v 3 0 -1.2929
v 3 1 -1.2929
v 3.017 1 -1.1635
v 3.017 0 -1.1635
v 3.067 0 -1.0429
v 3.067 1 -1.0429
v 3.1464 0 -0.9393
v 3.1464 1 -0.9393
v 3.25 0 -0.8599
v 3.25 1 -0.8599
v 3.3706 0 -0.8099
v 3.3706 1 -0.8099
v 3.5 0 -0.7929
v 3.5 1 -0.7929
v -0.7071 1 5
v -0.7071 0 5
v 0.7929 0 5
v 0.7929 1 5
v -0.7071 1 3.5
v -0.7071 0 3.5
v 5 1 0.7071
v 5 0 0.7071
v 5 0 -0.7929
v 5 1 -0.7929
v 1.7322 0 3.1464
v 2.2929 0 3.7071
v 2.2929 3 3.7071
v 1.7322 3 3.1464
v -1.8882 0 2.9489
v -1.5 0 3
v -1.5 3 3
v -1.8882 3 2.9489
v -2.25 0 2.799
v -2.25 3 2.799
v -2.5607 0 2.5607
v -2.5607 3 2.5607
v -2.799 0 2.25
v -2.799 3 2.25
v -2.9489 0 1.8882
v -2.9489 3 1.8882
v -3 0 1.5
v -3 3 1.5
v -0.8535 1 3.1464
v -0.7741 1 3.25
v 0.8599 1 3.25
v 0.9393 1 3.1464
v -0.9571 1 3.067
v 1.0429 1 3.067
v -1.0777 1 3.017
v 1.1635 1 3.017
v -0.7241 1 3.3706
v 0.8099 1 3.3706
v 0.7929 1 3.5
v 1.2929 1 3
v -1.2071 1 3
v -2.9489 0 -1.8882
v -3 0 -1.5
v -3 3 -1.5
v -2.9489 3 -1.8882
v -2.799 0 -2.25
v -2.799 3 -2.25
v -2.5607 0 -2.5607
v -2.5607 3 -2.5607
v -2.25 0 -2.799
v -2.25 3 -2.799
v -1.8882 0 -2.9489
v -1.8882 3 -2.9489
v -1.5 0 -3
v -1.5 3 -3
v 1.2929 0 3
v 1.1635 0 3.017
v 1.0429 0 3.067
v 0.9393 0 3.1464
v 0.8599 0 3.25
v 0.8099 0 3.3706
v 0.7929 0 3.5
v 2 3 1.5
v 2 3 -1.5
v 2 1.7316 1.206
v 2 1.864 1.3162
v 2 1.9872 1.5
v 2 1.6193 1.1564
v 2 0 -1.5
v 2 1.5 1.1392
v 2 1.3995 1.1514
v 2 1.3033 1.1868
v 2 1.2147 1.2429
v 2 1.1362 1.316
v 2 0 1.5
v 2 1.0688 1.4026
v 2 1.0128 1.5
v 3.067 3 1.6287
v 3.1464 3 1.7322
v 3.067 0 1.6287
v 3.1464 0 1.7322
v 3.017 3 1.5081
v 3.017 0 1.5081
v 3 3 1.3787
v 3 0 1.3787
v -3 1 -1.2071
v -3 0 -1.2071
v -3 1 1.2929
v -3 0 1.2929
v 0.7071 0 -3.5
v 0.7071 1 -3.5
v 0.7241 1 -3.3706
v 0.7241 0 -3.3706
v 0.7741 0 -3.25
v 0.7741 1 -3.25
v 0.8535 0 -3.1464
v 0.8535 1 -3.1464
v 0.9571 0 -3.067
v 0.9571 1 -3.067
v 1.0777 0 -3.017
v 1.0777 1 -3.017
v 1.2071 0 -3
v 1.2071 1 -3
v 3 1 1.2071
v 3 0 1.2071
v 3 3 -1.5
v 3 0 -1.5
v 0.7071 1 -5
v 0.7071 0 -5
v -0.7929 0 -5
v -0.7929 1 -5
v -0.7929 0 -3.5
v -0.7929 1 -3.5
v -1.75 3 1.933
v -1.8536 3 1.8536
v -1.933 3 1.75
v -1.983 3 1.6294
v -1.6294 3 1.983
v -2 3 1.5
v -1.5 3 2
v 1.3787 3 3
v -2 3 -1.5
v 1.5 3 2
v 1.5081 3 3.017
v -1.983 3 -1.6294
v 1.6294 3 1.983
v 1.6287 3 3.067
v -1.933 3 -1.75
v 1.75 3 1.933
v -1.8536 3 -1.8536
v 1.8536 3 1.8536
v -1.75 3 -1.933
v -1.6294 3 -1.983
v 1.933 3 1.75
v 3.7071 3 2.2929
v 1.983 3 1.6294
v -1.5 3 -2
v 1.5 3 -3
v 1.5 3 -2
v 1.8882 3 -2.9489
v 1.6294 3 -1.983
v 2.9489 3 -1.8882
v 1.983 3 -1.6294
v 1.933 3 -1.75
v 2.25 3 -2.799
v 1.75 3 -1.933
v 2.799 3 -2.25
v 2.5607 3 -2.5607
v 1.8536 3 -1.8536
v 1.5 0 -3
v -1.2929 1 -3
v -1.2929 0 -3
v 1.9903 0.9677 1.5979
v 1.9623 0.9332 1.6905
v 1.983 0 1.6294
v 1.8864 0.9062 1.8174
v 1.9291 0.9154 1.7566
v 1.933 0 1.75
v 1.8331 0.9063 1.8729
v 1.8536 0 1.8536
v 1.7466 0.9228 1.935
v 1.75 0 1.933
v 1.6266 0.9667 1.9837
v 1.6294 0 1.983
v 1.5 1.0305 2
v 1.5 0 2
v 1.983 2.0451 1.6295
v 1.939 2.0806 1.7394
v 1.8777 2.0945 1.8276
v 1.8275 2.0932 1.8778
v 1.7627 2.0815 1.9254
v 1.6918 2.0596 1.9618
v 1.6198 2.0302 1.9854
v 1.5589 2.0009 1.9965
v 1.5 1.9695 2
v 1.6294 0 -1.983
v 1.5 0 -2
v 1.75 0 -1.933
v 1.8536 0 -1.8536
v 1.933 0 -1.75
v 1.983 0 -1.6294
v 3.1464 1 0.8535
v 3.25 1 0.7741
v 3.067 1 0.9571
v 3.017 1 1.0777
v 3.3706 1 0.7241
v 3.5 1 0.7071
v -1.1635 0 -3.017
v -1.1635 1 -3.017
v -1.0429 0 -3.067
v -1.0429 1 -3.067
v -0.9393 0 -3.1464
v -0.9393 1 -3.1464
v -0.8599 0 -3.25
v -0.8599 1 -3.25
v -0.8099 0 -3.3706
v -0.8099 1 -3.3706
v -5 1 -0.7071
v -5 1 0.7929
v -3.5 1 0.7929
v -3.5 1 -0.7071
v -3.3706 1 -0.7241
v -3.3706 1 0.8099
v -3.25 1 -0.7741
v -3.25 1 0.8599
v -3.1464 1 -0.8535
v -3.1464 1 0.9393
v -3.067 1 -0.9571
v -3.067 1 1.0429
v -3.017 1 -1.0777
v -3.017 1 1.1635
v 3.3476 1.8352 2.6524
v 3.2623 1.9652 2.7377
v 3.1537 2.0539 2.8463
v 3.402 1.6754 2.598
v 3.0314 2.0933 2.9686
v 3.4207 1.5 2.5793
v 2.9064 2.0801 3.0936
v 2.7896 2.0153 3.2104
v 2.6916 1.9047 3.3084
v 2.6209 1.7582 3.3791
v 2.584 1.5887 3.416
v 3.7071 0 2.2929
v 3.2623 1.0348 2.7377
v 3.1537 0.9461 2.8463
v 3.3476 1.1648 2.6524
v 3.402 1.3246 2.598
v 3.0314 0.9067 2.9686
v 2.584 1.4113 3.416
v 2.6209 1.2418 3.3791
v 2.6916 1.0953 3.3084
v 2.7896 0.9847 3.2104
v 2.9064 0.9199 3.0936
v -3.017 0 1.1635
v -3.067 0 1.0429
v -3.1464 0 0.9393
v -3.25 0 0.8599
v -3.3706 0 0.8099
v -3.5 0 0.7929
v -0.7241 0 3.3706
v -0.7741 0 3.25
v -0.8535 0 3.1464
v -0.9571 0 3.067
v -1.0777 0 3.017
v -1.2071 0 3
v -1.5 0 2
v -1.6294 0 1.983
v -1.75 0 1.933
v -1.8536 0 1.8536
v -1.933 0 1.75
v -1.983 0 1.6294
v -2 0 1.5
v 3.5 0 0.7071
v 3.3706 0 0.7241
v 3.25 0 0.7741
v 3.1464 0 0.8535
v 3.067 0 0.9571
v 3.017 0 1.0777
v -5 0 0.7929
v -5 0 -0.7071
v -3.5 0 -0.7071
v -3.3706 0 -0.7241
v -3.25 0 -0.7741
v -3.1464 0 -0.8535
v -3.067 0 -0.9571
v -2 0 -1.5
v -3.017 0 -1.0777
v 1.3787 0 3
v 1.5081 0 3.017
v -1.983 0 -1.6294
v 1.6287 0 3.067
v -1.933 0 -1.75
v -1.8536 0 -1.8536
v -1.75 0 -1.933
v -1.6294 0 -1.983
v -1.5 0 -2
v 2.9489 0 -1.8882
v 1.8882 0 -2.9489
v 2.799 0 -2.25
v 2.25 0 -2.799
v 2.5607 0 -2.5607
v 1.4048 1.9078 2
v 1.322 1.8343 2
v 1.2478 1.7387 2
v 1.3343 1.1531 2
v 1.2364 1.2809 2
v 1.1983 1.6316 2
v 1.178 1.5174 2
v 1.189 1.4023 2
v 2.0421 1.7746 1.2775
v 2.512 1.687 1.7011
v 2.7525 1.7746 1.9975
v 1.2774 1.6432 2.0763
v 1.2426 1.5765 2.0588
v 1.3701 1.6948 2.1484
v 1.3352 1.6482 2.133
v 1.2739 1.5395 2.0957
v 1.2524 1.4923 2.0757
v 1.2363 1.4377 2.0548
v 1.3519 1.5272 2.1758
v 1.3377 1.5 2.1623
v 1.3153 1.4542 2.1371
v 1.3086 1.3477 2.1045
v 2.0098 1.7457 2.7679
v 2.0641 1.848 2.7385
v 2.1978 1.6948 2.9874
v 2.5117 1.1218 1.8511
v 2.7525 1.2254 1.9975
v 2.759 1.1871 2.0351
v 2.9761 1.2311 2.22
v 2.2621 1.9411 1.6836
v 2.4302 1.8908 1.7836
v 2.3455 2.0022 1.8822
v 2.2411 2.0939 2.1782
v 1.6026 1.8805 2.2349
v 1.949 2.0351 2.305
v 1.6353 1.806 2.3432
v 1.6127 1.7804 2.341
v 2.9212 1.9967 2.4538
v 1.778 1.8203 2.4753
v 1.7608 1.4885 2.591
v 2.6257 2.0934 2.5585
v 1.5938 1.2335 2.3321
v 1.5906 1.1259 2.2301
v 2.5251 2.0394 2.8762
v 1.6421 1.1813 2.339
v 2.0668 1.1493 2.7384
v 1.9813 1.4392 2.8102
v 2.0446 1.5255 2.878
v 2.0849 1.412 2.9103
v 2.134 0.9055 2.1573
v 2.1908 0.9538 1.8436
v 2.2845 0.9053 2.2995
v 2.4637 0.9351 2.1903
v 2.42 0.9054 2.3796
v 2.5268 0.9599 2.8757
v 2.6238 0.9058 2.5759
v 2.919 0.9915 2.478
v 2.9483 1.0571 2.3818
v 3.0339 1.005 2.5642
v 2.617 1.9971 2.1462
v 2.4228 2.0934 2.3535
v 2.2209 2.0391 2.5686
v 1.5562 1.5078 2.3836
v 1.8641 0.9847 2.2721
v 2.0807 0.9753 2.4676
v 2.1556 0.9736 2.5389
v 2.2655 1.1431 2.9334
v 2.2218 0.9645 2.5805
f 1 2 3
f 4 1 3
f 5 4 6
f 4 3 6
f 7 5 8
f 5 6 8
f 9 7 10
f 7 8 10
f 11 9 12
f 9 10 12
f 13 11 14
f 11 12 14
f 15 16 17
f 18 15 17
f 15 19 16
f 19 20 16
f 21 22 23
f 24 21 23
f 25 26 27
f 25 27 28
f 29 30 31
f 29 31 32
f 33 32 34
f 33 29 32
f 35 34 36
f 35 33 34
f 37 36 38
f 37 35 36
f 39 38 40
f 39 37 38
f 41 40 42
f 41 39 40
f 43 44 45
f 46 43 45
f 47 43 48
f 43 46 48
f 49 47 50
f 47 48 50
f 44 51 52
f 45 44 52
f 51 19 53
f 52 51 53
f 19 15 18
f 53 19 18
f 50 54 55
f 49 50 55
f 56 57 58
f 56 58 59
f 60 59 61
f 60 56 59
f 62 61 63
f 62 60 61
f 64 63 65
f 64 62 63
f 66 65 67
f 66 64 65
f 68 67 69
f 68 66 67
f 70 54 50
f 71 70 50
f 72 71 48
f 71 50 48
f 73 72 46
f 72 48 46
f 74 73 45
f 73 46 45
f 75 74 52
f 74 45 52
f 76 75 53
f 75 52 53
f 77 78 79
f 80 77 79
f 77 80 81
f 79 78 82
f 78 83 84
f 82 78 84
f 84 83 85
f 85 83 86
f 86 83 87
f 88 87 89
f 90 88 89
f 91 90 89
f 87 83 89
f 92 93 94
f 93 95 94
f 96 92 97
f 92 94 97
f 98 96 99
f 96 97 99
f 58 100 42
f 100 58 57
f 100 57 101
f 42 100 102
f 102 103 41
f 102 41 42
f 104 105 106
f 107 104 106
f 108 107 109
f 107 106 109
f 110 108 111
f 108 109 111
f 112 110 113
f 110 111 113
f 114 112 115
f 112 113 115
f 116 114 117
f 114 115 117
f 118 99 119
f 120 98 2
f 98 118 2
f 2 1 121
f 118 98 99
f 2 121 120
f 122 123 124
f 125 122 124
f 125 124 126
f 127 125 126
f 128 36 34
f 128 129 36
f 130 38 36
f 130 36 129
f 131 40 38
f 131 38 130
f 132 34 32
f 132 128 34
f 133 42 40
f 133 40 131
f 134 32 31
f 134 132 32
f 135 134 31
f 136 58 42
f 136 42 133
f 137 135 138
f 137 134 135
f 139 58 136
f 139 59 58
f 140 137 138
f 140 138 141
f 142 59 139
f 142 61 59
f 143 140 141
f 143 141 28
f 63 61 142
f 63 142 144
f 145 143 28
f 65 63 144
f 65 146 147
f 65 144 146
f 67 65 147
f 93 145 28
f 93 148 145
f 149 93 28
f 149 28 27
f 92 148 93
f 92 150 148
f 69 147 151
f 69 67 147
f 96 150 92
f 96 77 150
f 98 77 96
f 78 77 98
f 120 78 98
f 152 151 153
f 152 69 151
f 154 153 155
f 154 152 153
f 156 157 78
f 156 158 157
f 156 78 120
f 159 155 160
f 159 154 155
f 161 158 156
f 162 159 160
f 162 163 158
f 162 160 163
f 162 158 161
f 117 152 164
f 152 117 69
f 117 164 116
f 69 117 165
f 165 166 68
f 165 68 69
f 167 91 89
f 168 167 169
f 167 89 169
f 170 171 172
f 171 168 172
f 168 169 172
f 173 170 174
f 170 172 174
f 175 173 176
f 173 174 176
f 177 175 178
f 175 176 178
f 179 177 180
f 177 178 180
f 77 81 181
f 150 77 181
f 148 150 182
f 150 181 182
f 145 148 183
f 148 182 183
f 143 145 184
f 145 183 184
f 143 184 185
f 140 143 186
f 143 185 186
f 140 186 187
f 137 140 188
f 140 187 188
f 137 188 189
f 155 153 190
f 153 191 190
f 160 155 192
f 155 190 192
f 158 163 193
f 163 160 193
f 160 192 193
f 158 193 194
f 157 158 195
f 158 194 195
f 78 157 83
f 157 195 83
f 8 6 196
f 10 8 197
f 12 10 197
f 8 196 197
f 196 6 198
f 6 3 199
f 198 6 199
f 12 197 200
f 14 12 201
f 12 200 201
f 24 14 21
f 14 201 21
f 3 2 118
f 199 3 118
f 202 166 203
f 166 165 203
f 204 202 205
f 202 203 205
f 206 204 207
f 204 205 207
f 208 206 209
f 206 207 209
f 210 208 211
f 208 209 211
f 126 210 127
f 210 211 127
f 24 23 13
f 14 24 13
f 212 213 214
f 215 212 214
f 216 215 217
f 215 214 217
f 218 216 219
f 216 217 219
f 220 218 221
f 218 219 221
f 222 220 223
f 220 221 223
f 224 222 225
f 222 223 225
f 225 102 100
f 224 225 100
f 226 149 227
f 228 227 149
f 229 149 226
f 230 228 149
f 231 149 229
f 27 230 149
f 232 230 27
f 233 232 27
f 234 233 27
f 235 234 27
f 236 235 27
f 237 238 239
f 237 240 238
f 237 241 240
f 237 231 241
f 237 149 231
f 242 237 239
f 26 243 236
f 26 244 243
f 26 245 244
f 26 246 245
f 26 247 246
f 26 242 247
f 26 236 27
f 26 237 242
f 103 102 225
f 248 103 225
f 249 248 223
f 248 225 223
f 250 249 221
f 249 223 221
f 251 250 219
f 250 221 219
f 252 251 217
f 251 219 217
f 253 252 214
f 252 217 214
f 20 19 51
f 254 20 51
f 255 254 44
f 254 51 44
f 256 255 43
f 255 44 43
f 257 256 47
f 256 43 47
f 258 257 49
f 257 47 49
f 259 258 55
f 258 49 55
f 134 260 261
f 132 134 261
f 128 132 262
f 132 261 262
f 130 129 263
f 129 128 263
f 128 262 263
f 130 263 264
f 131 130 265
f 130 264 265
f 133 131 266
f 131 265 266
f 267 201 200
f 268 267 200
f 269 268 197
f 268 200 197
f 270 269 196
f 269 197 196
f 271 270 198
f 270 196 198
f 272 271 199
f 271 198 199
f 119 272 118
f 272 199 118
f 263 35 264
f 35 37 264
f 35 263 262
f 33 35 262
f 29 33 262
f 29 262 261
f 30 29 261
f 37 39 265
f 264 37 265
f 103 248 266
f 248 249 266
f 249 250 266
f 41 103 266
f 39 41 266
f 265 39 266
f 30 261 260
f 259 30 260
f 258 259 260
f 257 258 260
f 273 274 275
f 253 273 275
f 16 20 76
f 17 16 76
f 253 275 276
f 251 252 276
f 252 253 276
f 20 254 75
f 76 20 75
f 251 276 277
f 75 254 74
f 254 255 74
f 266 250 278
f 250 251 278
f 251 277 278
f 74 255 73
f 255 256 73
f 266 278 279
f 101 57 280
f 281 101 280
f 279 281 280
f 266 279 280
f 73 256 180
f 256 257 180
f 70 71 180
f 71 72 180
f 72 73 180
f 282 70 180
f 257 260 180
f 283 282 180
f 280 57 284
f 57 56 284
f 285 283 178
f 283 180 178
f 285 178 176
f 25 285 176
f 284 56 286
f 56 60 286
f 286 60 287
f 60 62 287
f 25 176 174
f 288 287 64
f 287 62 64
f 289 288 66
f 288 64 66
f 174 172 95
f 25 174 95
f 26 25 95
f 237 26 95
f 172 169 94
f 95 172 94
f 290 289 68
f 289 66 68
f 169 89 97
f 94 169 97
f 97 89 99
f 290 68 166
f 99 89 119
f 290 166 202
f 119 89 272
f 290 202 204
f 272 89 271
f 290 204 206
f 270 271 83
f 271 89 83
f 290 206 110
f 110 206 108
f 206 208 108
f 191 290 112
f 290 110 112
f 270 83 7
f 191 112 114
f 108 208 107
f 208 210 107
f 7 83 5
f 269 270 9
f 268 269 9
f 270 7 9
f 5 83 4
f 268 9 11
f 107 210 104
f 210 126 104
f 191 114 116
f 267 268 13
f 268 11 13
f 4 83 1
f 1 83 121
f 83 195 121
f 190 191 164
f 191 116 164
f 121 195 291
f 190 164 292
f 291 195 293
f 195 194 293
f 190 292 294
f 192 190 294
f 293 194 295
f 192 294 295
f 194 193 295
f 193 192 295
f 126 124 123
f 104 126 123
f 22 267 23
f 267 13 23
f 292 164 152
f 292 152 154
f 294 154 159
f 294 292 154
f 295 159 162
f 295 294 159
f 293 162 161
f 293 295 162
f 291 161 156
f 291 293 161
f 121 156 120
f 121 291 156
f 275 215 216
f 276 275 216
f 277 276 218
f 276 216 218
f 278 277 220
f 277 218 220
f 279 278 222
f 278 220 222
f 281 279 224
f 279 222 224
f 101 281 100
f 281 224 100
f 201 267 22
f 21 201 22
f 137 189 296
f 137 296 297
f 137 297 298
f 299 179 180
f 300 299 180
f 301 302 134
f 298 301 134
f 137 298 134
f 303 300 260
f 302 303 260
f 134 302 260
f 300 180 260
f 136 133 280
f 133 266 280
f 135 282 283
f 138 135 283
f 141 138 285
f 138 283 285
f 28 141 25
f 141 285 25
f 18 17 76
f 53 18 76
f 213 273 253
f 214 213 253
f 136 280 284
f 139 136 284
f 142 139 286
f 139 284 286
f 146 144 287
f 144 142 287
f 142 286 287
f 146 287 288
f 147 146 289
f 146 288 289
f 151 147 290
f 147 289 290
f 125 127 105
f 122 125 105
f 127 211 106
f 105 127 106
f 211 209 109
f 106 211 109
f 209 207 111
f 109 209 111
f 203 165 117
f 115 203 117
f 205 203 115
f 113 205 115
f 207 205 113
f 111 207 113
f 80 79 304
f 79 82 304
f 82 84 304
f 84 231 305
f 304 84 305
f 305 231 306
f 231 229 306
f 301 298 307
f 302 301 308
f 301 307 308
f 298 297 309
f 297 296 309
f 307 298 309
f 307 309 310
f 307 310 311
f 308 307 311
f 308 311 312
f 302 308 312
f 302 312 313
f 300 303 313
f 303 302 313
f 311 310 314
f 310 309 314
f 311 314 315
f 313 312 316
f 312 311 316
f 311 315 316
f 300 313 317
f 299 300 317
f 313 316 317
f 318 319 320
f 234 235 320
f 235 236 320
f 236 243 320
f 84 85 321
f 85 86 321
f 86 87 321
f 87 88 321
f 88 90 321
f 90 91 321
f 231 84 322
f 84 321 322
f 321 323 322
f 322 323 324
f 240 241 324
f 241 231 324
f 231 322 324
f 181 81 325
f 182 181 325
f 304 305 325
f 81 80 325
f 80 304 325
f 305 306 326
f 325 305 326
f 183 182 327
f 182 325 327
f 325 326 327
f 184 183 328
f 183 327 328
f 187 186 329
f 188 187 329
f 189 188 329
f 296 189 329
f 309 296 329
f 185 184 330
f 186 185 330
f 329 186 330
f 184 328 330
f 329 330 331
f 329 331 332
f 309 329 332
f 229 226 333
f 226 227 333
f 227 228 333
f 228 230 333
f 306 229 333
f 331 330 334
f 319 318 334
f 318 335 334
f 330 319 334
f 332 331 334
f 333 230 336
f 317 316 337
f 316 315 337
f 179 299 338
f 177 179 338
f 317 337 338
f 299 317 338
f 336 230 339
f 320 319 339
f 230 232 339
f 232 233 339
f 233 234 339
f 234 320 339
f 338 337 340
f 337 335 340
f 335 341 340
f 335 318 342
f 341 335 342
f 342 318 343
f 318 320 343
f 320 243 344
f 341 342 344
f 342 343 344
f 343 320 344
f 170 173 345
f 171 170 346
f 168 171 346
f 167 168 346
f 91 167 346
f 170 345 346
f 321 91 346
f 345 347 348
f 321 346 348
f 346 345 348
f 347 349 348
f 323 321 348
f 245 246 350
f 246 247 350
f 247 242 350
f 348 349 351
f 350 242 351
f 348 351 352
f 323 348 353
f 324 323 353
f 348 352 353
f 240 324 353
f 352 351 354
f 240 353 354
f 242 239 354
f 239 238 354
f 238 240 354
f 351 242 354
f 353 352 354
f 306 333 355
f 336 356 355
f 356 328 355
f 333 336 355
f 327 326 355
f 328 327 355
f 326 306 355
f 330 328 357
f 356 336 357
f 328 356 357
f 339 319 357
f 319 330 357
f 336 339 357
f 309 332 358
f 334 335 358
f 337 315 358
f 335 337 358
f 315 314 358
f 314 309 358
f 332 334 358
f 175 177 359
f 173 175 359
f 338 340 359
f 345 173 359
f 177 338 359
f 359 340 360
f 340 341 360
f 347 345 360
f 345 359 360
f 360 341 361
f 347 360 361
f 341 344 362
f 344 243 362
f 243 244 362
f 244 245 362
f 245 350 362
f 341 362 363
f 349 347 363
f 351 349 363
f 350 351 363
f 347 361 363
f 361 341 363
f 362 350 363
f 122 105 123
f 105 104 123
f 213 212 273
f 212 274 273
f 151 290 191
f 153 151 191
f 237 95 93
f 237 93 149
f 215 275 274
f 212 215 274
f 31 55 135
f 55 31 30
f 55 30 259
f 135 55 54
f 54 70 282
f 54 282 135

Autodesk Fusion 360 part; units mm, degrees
sketch "Sketch1" plane through (0, 0, 0) normal (0, 1, 0) x (1, 0, 0)
  line L0 (1.5, -2) -> (-1.5, -2)
  line L1 (-2, -1.5) -> (-2, 1.5)
  line L2 (-1.5, 2) -> (1.5, 2)
  line L3 (2, 1.5) -> (2, -1.5)
  line L4 (2, -2) -> (-2, 2) construction
  line L5 (-2, -2) -> (2, 2) construction
  line L6 (-1.5, -3) -> (1.5858, -3)
  line L7 (3, -1.5858) -> (3, 1.5)
  line L8 (1.5, 3) -> (-1.5, 3)
  line L9 (-3, 1.5) -> (-3, -1.5)
  line L10 (-3, -3) -> (3, 3) construction
  line L11 (3, -3) -> (-2.9939, 2.9939) construction
  arc A0 (-1.5, 2) -> (-2, 1.5) centre (-1.5, 1.5) ccw
  arc A1 (-2, -1.5) -> (-1.5, -2) centre (-1.5, -1.5) ccw
  arc A2 (1.5, -2) -> (2, -1.5) centre (1.5, -1.5) ccw
  arc A3 (2, 1.5) -> (1.5, 2) centre (1.5, 1.5) ccw
  arc A4 (-1.5, 3) -> (-3, 1.5) centre (-1.5, 1.5) ccw
  arc A5 (-3, -1.5) -> (-1.5, -3) centre (-1.5, -1.5) ccw
  arc A6 (3, 1.5) -> (1.5, 3) centre (1.5, 1.5) ccw
  line L12 (3.7071, -2.2929) -> (2.2929, -3.7071)
  line L13 (2.2929, -3.7071) -> (1.5858, -3)
  line L14 (3, -1.5858) -> (3.7071, -2.2929)
  dimension "d1" = 4
  dimension "d2" = 4
  dimension "d3" = 0.5
  dimension "d4" = 6
  dimension "d5" = 6
  dimension "d6" = 1.5
  dimension "d7" = 2
  dimension "d31" = 2
  dimension "d32" = 3
extrude "Extrude1" add sketch "Sketch1" along normal blind 2.5
sketch "Sketch2" plane through (3, 0, 3) normal (0.707107, 0, 0.707107) x (0.707107, 0, -0.707107)
  line L0 (-1, 0) -> (1, 0)
  line L1 (1, 0) -> (1, 2.5)
  line L2 (1, 2.5) -> (-1, 2.5)
  line L3 (-1, 2.5) -> (-1, 0)
  circle A0 centre (0, 1.5) radius 0.595
  dimension "d10" = 1.19
  dimension "d11" = 1.5
extrude "Extrude2" cut sketch "Sketch2" against normal blind 3.4 contours A0
sketch "Sketch4" plane through (0, 0, 0) normal (0, -1, 0) x (1, 0, 0)
  arc A0 (2, 1.5) -> (1.5, 2) centre (1.5, 1.5) ccw
  line L0 (2, 1.5) -> (2, -1.5)
  arc A1 (1.5, -2) -> (2, -1.5) centre (1.5, -1.5) ccw
  line L1 (1.5, -2) -> (-1.5, -2)
  arc A2 (-2, -1.5) -> (-1.5, -2) centre (-1.5, -1.5) ccw
  line L2 (-2, -1.5) -> (-2, 1.5)
  arc A3 (-1.5, 2) -> (-2, 1.5) centre (-1.5, 1.5) ccw
  line L3 (-1.5, 2) -> (1.5, 2)
  line L4 (3, 1.5858) -> (3.7071, 2.2929)
  line L5 (3.7071, 2.2929) -> (2.2929, 3.7071)
  line L6 (2.2929, 3.7071) -> (1.5858, 3)
  line L7 (1.5858, 3) -> (-1.5, 3)
  arc A4 (-1.5, 3) -> (-3, 1.5) centre (-1.5, 1.5) ccw
  line L8 (-3, 1.5) -> (-3, -1.5)
  arc A5 (-3, -1.5) -> (-1.5, -3) centre (-1.5, -1.5) ccw
  line L9 (-1.5, -3) -> (1.5, -3)
  arc A6 (1.5, -3) -> (3, -1.5) centre (1.5, -1.5) ccw
  line L10 (3, -1.5) -> (3, 1.5858)
  line L11 (-0.7071, 5) -> (0.7929, 5)
  line L12 (0.7929, 5) -> (0.7929, 3)
  line L13 (-0.7071, 3) -> (-0.7071, 5)
  line L14 (-0.7071, 5) -> (0.6239, 1.4506) construction
  line L15 (0.7929, 5) -> (-0.5381, 1.4506) construction
  line L16 (-5, -0.7071) -> (-1.4506, 0.6239) construction
  line L17 (-5, -0.7071) -> (-5, 0.7929)
  line L18 (-5, 0.7929) -> (-1.4506, -0.5381) construction
  line L19 (-3, -0.7071) -> (-5, -0.7071)
  line L20 (-5, 0.7929) -> (-3, 0.7929)
  line L21 (0.7071, -5) -> (-0.6239, -1.4506) construction
  line L22 (0.7071, -5) -> (-0.7929, -5)
  line L23 (-0.7929, -5) -> (0.5381, -1.4506) construction
  line L24 (0.7071, -3) -> (0.7071, -5)
  line L25 (-0.7929, -5) -> (-0.7929, -3)
  line L26 (5, 0.7071) -> (1.4506, -0.6239) construction
  line L27 (5, 0.7071) -> (5, -0.7929)
  line L28 (5, -0.7929) -> (1.4506, 0.5381) construction
  line L29 (3, 0.7071) -> (5, 0.7071)
  line L30 (5, -0.7929) -> (3, -0.7929)
  line L31 (0.0429, 3) -> (0.0429, 5) construction
  line L32 (0.6239, 1.4506) -> (-0.5381, 1.4506)
  point P0 (0.0429, 3)
  point P1 (-3, 0.0429)
  point P2 (-0.0429, -3)
  point P3 (3, -0.0429)
  dimension "d26" = 360
  dimension "d29" = 1.5
  dimension "d30" = 2
extrude "Extrude4" add sketch "Sketch4" against normal blind 1 contours L10 L27 L29 L30 | L7 L11 L12 L13 | L9 L22 L24 L25 | L8 L17 L19 L20
fillet "Fillet2" radius 0.5 8 edges at (3, 0.5, 0.7071) (0.7929, 0.5, 3) (3, 0.5, -0.7929) (0.7071, 0.5, -3) (-0.7929, 0.5, -3) (-3, 0.5, -0.7071) (-0.7071, 0.5, 3) (-3, 0.5, 0.7929)
fillet "Fillet3" radius 0.5 2 edges at (1.5858, 1.25, 3) (3, 1.25, 1.5858)
extrude "Extrude5" add 1 faces at (2.3333, 2.5, 0.4596) along direction (0, 1, 0) blind 0.5
